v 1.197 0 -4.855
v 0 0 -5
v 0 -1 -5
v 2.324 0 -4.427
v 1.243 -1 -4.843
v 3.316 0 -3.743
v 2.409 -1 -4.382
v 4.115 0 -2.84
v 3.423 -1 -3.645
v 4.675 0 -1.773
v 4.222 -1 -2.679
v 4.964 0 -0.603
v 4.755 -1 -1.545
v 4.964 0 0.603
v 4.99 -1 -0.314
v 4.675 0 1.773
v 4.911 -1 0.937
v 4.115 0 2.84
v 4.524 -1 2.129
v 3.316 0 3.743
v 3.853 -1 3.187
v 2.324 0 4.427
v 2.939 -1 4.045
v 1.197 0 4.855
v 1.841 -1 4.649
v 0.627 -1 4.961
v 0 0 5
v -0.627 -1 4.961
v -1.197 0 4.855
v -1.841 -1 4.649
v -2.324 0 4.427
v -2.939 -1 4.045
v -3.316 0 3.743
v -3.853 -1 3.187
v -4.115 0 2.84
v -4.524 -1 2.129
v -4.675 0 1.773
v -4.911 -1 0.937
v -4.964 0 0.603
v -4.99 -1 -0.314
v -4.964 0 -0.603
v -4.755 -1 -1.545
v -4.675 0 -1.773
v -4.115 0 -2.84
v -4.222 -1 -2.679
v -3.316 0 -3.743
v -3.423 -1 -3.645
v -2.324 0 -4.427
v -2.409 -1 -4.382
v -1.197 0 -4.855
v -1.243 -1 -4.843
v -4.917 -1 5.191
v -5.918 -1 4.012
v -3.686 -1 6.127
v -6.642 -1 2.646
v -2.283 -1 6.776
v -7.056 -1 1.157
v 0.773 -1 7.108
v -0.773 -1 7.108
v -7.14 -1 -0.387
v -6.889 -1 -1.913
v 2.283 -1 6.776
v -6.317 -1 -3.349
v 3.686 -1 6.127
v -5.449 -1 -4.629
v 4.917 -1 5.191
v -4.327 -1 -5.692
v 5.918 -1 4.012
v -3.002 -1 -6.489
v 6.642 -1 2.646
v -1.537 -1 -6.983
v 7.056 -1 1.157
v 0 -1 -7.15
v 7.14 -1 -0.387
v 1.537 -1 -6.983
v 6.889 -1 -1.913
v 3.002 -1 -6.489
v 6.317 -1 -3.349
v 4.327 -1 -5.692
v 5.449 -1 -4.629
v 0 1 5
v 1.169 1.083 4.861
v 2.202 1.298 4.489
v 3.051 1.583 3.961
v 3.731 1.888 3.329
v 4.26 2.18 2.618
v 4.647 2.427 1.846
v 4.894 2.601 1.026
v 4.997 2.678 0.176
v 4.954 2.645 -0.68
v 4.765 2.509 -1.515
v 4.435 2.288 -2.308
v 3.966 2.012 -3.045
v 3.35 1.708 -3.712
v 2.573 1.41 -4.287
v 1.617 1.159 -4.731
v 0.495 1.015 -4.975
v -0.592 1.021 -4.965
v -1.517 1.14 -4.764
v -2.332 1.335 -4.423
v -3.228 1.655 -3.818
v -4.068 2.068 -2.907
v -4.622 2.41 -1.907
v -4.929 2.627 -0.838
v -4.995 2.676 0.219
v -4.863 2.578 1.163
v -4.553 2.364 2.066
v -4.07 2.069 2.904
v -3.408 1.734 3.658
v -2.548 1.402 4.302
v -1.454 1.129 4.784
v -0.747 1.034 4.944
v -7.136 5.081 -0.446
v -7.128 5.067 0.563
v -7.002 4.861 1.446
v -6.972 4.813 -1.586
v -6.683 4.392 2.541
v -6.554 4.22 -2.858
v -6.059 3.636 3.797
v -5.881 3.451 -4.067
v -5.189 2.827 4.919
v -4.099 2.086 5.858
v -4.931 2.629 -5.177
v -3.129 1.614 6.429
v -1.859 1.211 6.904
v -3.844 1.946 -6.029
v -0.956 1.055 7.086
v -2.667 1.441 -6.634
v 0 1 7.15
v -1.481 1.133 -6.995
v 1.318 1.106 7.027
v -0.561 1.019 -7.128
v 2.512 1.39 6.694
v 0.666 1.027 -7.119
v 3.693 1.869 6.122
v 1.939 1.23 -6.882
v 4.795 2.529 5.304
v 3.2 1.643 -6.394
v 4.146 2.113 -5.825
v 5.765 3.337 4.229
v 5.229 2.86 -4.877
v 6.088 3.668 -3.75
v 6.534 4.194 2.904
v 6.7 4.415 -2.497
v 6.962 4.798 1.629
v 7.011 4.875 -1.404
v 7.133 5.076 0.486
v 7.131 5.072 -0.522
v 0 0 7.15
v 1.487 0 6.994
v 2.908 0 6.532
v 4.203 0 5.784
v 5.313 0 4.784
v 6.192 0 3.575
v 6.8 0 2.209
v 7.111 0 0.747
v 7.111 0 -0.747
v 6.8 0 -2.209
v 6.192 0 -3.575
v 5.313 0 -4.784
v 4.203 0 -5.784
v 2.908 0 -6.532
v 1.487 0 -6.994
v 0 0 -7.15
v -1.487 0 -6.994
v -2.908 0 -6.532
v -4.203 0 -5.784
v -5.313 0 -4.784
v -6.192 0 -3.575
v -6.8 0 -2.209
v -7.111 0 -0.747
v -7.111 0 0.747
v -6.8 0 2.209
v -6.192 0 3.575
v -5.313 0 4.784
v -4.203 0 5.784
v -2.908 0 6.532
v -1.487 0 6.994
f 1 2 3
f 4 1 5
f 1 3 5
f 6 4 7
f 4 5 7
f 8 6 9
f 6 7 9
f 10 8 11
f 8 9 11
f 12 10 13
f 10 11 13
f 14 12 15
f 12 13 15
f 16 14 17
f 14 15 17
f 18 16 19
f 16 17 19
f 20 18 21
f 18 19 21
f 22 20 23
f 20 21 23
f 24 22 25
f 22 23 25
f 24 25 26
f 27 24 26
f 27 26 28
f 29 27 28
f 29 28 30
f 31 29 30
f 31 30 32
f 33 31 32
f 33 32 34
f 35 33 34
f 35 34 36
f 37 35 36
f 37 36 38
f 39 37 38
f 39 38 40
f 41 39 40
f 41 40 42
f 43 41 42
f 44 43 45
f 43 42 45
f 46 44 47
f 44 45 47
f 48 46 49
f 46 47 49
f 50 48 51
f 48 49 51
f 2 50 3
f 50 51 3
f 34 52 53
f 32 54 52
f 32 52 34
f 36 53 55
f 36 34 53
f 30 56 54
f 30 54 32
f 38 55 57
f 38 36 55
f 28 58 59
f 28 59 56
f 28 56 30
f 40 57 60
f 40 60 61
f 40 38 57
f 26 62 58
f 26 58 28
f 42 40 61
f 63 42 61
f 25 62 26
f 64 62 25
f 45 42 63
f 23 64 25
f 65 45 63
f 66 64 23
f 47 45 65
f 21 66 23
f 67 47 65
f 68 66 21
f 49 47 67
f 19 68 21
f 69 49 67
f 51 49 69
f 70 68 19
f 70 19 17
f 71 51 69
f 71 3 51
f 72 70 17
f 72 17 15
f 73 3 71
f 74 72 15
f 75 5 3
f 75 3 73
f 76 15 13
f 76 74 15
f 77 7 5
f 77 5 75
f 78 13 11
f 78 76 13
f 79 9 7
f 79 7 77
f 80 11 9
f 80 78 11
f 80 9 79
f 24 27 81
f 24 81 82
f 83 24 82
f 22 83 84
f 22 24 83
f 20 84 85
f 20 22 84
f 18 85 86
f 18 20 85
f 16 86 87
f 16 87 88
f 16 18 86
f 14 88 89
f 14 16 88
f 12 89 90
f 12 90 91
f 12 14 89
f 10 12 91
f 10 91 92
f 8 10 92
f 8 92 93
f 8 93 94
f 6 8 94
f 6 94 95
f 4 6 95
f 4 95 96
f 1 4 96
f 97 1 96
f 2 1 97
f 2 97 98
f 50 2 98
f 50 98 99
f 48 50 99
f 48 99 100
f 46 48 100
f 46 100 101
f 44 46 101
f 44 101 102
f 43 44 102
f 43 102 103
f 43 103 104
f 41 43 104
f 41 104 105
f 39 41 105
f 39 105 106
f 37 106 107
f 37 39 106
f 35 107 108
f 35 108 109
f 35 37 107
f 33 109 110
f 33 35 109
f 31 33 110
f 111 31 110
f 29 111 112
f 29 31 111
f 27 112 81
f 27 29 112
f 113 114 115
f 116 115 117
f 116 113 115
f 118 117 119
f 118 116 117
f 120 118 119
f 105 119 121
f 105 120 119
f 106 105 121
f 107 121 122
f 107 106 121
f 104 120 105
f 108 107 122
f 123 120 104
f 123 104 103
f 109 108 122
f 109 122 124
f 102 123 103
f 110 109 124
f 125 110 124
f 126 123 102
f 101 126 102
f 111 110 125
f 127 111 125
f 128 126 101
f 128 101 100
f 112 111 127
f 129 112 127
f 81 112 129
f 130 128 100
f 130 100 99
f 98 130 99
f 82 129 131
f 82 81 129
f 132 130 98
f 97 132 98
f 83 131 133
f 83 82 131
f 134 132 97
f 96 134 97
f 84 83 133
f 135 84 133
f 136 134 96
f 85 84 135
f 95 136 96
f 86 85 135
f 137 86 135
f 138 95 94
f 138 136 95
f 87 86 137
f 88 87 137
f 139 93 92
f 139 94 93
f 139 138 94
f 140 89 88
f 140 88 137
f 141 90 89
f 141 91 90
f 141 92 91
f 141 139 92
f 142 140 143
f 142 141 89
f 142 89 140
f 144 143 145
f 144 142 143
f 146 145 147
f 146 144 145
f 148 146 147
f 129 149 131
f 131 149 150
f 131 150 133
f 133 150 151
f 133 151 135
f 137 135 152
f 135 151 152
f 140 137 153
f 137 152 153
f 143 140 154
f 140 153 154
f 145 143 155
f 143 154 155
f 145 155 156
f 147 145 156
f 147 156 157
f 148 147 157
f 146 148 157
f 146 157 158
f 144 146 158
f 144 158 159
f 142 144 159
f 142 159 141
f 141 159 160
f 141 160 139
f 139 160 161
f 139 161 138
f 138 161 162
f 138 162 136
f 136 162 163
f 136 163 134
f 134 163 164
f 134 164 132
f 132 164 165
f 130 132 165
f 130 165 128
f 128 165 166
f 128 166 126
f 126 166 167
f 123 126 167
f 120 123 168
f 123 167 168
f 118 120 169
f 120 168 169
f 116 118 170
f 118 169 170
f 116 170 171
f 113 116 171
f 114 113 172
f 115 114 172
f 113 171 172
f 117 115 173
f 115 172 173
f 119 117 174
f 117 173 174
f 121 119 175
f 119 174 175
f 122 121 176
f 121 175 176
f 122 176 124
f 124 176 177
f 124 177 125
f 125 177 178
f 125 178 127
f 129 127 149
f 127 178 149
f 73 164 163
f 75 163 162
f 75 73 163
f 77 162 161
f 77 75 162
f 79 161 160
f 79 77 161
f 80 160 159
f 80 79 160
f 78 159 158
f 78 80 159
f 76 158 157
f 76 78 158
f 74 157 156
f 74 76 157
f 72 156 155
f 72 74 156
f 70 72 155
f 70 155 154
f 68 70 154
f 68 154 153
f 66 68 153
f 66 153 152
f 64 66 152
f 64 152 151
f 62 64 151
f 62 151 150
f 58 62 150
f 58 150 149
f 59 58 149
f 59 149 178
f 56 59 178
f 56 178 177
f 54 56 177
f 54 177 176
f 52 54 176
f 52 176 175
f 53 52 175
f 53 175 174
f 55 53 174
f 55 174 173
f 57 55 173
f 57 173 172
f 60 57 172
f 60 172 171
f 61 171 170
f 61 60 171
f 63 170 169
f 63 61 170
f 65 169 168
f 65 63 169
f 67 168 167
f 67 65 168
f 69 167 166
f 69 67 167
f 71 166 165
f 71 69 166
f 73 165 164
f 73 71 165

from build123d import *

# Parameters (mm, degrees)
SKETCH1_R               = 7.15
SKETCH1_R_2             = 5
BOSS_EXTRUDE1_DEPTH     = 10
CUT_EXTRUDE1_DEPTH      = 15.221286862
CUT_EXTRUDE1_DEPTH_BACK = 15.221286862
SKETCH2_R               = 8.28
BOSS_EXTRUDE2_START     = 1
SKETCH3_R               = 7.15
SKETCH3_R_2             = 5
BOSS_EXTRUDE2_DEPTH     = 1


with BuildPart() as part:
    # Sketch1 → Boss-Extrude1 (new body)
    with BuildSketch(Plane(origin=(0, 0, 0), x_dir=(1, 0, 0), z_dir=(0, 1, 0))):
        with Locations(Location((0, 0, 0), (0, 0, 270))):
            Circle(SKETCH1_R)
        with Locations(Location((0, 0, 0), (0, 0, 270))):
            Circle(SKETCH1_R_2, mode=Mode.SUBTRACT)
    extrude(amount=BOSS_EXTRUDE1_DEPTH)

    # Sketch2 → Cut-Extrude1 (cut, two sides: drawn at the far end of the back side and taken through both)
    with BuildSketch(Plane.XY.offset(-CUT_EXTRUDE1_DEPTH_BACK)):
        with Locations((0, 9.28)):
            Circle(SKETCH2_R)
    extrude(amount=CUT_EXTRUDE1_DEPTH + CUT_EXTRUDE1_DEPTH_BACK, mode=Mode.SUBTRACT)

    # Sketch3 → Boss-Extrude2 (add)
    with BuildSketch(Plane.XZ.offset(BOSS_EXTRUDE2_START)):
        with Locations(Location((0, 0, 0), (0, 0, 270))):
            Circle(SKETCH3_R)
        with Locations(Location((0, 0, 0), (0, 0, 270))):
            Circle(SKETCH3_R_2, mode=Mode.SUBTRACT)
    extrude(amount=-BOSS_EXTRUDE2_DEPTH)


solid = part.part
